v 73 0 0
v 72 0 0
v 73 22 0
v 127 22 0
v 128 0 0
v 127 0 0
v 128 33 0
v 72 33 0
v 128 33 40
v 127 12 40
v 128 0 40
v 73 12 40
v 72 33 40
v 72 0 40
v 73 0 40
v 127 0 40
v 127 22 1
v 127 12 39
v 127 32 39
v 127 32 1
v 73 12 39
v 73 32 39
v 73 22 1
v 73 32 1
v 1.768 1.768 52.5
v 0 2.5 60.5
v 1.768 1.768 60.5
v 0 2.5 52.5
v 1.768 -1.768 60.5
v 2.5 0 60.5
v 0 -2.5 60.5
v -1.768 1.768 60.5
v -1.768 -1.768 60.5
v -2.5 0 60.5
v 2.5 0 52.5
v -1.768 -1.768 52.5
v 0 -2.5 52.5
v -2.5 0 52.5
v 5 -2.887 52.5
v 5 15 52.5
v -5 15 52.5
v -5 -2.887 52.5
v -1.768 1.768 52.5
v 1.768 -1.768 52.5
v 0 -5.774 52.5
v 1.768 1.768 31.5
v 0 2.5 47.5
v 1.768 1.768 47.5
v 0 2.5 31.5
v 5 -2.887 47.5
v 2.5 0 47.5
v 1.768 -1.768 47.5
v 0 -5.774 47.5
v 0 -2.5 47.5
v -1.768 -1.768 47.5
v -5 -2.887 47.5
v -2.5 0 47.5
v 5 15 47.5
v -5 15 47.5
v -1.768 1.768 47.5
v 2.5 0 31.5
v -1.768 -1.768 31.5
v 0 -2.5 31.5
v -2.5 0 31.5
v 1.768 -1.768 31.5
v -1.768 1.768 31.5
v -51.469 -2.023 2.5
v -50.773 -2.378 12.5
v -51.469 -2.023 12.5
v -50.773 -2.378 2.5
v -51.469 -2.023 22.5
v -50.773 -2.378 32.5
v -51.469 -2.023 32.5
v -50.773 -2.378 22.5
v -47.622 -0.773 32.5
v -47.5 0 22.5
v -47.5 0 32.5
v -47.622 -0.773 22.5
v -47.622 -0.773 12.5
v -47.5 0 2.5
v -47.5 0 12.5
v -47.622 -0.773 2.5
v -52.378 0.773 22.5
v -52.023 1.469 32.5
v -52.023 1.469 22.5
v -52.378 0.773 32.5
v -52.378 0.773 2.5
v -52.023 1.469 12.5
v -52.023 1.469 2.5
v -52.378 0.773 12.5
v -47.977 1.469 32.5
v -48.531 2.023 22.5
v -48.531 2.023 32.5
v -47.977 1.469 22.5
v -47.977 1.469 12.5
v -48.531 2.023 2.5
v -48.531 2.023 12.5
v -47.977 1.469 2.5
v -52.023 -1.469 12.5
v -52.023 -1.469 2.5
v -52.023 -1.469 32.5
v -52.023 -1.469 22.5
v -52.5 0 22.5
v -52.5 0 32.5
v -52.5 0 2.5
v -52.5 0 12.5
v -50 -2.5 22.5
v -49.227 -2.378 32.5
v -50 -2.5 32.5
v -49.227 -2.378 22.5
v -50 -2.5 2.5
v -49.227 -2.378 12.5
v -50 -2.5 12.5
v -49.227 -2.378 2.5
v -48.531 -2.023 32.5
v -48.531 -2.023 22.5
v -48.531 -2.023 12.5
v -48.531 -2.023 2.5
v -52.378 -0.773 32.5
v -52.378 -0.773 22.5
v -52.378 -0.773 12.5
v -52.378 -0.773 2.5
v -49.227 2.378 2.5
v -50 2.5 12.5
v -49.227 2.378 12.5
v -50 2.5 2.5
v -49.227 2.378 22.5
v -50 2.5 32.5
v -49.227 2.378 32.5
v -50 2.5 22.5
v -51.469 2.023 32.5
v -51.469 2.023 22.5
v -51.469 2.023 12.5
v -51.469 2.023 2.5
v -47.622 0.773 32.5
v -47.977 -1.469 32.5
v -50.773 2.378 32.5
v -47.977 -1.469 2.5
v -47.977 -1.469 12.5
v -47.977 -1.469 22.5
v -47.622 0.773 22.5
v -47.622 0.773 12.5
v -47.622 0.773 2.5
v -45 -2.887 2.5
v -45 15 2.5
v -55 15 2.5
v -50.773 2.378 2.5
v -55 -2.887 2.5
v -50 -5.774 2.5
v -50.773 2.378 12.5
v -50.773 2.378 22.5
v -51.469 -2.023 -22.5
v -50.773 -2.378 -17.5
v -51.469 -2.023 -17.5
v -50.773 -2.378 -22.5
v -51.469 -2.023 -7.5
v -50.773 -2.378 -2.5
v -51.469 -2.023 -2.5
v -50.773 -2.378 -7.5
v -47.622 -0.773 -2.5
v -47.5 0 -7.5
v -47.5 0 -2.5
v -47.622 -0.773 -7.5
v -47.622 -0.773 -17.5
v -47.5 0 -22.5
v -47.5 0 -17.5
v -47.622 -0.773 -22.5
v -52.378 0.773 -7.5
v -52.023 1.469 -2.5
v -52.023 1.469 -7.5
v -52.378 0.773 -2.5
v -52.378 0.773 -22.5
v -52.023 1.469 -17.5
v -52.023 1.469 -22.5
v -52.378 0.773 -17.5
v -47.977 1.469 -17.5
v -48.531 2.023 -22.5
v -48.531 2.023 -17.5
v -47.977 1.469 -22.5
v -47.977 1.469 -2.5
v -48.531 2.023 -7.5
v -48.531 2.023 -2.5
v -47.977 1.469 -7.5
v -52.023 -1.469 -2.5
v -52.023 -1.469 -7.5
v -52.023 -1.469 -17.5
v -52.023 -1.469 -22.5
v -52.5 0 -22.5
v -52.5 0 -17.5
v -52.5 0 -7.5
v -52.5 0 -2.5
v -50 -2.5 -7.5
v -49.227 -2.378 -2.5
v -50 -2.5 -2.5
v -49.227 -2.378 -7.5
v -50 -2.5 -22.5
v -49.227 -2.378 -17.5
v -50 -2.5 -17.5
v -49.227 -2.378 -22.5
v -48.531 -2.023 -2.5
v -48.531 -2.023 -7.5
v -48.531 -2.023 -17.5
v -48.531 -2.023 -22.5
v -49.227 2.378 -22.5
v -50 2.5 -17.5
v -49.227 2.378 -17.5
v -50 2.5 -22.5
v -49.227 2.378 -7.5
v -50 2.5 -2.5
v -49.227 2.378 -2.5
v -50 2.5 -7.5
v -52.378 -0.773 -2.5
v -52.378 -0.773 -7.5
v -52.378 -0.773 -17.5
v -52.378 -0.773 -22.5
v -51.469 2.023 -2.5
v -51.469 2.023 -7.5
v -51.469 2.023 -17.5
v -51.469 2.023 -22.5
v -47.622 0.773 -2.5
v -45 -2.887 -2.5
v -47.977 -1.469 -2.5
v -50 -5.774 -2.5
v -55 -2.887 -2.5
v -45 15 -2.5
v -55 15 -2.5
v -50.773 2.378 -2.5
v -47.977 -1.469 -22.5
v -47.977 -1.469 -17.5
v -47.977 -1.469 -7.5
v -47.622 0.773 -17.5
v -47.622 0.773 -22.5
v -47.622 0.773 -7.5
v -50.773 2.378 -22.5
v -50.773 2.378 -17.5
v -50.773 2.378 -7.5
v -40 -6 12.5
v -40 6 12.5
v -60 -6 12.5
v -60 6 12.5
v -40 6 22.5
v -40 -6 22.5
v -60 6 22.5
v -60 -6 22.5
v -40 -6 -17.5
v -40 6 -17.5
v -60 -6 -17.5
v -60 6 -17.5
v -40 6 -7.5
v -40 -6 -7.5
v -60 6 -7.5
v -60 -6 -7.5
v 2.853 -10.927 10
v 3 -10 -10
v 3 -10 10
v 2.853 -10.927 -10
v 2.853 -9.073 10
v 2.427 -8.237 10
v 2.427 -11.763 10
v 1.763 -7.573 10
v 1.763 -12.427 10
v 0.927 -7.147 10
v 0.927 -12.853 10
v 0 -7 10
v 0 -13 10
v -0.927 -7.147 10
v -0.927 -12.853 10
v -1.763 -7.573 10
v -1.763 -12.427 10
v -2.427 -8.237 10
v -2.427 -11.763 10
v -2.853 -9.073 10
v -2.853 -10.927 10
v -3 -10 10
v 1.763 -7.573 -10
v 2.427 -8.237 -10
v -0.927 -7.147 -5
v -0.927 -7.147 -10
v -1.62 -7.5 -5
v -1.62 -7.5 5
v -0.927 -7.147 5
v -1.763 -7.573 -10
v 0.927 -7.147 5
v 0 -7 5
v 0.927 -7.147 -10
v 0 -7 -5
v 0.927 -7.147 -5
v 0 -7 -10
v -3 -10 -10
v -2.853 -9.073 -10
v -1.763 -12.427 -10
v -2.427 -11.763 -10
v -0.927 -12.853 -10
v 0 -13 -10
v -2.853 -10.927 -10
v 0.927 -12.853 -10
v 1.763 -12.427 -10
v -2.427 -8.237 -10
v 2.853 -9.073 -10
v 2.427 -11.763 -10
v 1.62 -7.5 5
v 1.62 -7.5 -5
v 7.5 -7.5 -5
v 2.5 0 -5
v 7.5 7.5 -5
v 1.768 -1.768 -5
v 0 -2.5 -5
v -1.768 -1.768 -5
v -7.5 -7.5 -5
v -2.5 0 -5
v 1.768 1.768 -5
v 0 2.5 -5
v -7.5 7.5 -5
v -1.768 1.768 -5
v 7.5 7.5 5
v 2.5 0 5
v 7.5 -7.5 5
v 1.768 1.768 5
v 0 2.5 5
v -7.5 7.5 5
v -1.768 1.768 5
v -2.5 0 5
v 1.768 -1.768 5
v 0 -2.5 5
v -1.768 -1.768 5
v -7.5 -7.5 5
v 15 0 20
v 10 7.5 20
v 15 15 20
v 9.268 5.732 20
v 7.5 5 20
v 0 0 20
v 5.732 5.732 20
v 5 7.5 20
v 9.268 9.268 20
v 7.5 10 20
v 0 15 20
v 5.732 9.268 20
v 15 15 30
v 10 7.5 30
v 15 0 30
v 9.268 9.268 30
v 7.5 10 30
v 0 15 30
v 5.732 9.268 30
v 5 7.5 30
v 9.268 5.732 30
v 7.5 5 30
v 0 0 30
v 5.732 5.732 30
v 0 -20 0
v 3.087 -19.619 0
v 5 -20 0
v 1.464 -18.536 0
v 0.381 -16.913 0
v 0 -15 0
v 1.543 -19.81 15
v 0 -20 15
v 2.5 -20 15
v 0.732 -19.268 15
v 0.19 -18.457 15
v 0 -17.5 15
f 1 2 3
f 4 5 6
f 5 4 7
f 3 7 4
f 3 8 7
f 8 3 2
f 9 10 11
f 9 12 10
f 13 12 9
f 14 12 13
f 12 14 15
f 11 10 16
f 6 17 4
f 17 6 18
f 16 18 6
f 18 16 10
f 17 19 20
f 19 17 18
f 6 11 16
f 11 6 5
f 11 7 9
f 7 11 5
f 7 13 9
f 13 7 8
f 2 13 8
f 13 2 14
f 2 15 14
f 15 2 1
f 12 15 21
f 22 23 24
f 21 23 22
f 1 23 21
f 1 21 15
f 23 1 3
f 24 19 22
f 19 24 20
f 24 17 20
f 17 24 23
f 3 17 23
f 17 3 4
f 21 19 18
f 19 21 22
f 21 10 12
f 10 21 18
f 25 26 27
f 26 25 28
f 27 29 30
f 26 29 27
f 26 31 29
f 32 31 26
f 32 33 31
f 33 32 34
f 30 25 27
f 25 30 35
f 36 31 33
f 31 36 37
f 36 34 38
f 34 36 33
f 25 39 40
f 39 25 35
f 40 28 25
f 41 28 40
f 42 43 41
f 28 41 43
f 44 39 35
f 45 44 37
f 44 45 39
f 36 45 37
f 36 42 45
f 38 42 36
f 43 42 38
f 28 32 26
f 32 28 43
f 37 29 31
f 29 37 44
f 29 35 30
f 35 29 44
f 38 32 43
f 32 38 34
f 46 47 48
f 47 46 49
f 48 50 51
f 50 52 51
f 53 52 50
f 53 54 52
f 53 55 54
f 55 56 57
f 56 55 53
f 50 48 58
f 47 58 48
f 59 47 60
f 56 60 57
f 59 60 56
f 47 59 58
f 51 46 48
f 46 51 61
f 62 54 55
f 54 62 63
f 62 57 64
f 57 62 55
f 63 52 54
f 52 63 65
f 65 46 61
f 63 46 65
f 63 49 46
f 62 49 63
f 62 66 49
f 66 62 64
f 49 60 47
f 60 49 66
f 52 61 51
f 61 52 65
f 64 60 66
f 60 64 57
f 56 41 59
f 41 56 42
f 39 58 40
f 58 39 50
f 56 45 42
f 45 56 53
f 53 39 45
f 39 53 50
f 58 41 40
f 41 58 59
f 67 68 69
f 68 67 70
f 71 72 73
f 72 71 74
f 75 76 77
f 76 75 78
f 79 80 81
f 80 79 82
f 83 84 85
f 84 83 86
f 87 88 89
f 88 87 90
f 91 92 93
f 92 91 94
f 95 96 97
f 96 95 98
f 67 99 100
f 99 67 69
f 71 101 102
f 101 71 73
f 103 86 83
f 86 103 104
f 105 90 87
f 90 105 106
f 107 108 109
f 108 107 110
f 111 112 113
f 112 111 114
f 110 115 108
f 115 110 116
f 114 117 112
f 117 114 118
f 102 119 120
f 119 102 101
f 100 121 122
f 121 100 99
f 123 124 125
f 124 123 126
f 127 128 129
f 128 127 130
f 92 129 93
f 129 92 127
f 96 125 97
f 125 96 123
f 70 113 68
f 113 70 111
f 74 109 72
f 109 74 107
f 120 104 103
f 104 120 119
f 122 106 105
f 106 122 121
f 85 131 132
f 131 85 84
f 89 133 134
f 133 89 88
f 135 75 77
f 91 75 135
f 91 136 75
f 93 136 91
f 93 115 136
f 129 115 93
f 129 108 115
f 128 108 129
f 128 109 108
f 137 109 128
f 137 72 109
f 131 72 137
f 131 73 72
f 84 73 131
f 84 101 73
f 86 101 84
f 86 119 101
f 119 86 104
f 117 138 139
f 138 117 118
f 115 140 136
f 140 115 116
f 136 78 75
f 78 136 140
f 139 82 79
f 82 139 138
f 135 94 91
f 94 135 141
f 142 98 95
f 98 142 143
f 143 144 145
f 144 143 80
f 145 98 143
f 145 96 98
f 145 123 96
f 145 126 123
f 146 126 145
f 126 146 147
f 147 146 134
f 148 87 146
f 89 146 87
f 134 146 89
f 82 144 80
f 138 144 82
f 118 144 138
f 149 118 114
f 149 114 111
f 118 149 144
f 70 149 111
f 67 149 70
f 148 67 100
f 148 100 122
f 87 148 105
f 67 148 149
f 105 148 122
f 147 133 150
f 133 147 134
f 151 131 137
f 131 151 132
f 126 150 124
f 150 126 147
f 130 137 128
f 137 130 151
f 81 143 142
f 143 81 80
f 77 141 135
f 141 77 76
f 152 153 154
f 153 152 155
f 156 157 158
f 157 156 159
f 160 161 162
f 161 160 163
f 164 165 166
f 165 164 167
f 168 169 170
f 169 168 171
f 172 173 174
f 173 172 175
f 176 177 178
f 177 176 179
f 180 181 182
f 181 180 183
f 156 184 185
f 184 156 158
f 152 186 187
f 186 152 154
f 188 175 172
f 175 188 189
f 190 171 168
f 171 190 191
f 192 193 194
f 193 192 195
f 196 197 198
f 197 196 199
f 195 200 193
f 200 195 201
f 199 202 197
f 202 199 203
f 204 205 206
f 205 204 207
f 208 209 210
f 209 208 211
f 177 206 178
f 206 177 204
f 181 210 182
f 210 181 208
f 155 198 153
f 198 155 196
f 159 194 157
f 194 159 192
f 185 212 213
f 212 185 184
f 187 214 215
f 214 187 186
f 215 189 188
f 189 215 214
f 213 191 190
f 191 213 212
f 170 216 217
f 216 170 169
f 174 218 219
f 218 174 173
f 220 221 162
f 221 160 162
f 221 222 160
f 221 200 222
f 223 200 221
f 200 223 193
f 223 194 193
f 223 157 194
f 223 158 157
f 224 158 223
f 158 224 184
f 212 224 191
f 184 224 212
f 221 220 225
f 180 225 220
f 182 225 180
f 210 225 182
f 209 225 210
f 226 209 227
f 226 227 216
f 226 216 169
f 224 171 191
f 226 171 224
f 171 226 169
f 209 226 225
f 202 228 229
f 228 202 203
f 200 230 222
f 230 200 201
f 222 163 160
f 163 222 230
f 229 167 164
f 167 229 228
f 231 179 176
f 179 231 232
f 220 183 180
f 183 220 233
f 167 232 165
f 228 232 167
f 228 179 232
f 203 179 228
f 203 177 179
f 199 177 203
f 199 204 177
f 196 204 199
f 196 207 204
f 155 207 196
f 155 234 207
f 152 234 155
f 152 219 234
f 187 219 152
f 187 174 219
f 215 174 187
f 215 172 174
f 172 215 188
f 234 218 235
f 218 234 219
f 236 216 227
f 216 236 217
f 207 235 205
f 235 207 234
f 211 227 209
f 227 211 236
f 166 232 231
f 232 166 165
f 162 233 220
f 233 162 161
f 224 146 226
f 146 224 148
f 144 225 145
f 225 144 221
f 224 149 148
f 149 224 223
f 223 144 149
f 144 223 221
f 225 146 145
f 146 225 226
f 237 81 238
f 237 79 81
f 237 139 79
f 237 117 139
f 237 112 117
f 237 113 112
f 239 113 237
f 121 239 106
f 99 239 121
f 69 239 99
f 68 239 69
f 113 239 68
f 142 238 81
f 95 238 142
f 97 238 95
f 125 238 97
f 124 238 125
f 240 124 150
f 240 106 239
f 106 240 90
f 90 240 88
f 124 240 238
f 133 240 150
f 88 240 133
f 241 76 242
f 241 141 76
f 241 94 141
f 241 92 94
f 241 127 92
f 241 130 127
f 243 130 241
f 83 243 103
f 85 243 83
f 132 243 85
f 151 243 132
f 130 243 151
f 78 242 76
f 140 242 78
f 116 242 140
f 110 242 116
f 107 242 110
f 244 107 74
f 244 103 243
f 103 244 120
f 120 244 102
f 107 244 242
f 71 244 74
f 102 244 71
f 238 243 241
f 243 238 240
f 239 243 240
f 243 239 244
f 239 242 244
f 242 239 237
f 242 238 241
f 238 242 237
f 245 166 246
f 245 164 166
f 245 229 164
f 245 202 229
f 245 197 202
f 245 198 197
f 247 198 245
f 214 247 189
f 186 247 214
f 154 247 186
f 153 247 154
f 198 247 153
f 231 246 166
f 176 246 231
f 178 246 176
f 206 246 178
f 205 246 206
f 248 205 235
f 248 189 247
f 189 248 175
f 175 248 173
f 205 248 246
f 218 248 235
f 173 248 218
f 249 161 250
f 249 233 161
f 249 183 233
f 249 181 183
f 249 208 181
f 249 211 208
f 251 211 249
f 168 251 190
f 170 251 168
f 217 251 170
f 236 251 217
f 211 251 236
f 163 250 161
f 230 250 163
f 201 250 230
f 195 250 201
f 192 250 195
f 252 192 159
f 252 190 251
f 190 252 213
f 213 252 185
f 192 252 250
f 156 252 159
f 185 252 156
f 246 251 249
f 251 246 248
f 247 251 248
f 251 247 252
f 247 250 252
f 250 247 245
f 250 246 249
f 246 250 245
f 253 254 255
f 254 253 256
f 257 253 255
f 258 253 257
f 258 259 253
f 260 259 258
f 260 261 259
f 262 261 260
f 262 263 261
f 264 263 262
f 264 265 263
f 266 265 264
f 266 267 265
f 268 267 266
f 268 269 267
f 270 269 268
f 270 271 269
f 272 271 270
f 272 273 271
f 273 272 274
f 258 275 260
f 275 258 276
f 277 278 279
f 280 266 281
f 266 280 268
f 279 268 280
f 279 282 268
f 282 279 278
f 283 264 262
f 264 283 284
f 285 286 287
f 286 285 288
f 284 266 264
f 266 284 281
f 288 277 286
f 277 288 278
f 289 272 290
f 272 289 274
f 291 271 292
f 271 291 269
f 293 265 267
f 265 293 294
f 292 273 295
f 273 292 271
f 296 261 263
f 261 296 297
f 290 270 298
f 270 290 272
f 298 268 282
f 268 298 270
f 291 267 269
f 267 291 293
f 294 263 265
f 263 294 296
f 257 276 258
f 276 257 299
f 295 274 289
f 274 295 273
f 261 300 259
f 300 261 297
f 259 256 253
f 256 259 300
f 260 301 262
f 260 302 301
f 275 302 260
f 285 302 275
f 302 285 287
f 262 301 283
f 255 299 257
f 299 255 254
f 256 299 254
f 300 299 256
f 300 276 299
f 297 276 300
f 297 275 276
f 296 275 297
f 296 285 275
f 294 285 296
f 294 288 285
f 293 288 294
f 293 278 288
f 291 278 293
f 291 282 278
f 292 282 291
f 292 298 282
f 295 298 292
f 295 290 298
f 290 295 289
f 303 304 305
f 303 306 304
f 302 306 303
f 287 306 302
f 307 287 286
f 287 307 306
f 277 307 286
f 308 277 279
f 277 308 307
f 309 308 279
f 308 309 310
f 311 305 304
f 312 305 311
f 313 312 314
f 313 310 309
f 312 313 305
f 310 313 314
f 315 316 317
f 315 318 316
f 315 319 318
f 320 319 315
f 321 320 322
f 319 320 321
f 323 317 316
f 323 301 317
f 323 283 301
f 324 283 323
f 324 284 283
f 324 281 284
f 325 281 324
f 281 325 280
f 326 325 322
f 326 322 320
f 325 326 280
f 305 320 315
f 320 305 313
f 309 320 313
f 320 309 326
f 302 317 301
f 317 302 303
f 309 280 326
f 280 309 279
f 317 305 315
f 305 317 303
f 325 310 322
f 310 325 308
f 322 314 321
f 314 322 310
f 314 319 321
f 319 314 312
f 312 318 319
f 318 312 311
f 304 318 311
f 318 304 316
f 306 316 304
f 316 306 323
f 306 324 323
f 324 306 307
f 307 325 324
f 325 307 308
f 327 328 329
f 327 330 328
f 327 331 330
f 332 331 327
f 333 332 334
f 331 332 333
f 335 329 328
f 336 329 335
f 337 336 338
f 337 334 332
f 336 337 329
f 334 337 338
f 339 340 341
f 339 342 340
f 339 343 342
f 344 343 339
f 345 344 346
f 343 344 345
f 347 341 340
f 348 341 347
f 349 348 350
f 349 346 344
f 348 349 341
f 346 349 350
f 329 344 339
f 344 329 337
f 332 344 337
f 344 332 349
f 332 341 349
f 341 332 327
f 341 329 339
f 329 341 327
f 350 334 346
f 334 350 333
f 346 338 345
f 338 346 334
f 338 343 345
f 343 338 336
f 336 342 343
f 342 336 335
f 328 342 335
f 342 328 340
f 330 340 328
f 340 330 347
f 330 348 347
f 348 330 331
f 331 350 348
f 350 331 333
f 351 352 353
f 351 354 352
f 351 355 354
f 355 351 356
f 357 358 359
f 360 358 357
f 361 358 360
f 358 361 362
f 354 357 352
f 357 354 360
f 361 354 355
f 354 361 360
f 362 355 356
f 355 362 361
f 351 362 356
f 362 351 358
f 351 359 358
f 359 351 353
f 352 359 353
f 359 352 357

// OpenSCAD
// file: metric_dimensions.scad
// Dimensions a few metric fasteners.
// Author: James Synge
// Units: mm

////////////////////////////////////////////////////////////////////////////////
// Selected metric screw and nut size info (maximum dimensions), ISO 4032.
// For the washers, using standard DIN 125 / ISO 7089:
//    https://www.engineersedge.com/iso_flat_washer.htm

m4_screw_diam = 4;
m4_hole_diam = 4.5;
m4_nut_diam1 = 7;  // Width across the flats
m4_nut_diam2 = 7.66;  // Width across the corners
m4_nut_height = 3.2;
m4_washer_hole_diam = 4.3;
m4_washer_diam = 9;
m4_washer_thickness = 0.8;

m5_screw_diam = 5;
m5_hole_diam = 5.5;
m5_nut_diam1 = 8;  // Width across the flats
m5_nut_diam2 = 8.79;  // Width across the corners
m5_nut_height = 4.7;


// Given the width across a six sided nut (flat side to flat side),
// how wide is the nut from point to farthest point (i.e. what is the
// diameter of the smallest circle that will enclose the nut).
function hex_short_to_long_diag(d) = d * 2.0 / sqrt(3.0);
// main file
include <metric_dimensions.scad>


translate([100,0,0]) motor_cover_shell(50, 40, 30, shell_wall=1,
bracing0=10, bracing1=20
);


color("blue")
translate([0,-10,0]) {
  $fn=20;
  symmetric_z_cylinder(6,20);
}

module symmetric_z_cylinder(d=undef, l=undef, r=undef, convexity=3) {
  assert((d>0 && r==undef) || (d==undef && r>0));
  assert(l!=undef && l>0);
  translate([0,0,-l/2])
    linear_extrude(height=l, convexity=convexity)
      circle(d=d, r=r);
}



// Helper for creating the hollow box
// around a motor cover. Has 3 sides,
// not counting those due to the non-zero
// thickness of the shell.
// extra_z is below the z=0 plane.
module motor_cover_shell(motor_w, motor_h, motor_z, motor_gap=2, shell_wall=0, shellw=0, shellh=0, shellz=0, extra_z=0, bracing0=0, bracing1=0) {

  shell_w = max(shell_wall, shellw);
  shell_h = max(shell_wall, shellh);
  shell_z = max(shell_wall, shellz);

  assert(shell_w>0);
  assert(shell_z>0);

  inner_w=motor_w + motor_gap*2;
  inner_z=motor_z + motor_gap + extra_z;
  
  outer_w = inner_w + shell_w * 2;
  outer_z = inner_z + shell_z;

  linear_extrude(height=motor_h, convexity=10) {
    translate([-outer_w/2, -extra_z, 0]) {
      difference() {
        square([outer_w, outer_z], center=false);
        translate([shell_w,0,0])
          square([inner_w, inner_z], center=false);
      }
    }
  }
  
  if (bracing0 > 0) {
    // Add some strength at the z=0 plane.
    assert(shell_h>0);
    linear_extrude(height=shell_wall, convexity=10)
      translate([-outer_w/2, motor_z + motor_gap - bracing0, 0]) 
        square([outer_w, bracing0+shell_wall]);
  }

  if (bracing1 > 0) {
    // Add some strength at the z=motor_h plane.
    assert(shell_h>0);
    translate([0,0, motor_h-shell_wall])
      linear_extrude(height=shell_wall, convexity=10)
        translate([-outer_w/2, motor_z + motor_gap - bracing1, 0]) 
          square([outer_w, bracing1+shell_wall]);
  }
}



translate([0, 0, 50]) nut_slot(nut_diam=10, nut_height=5, depth=15, bolt_diam=5, bolt_up=8, bolt_down=16);

module nut_slot(nut_diam=0, nut_height=0, depth=0, bolt_diam=0, bolt_up=0, bolt_down=0, fn=undef) {
  translate([0, 0, -nut_height/2]) {
    rotate([0,0,360/12])
      linear_extrude(height=nut_height)
        circle(d=hex_short_to_long_diag(nut_diam), $fn=6);
    linear_extrude(height=nut_height)
      translate([-nut_diam/2, 0, 0])
        square([nut_diam, depth], center=false);
  
    assert(bolt_diam >= 0);
    assert(bolt_up >= 0);
    assert(bolt_down >= 0);
  
    if (bolt_diam > 0) {
      if (bolt_up > 0) {
        translate([0,0,nut_height])
          linear_extrude(height=bolt_up)
            circle(d=bolt_diam, $fn=fn);
      }
      if (bolt_down > 0) {
        translate([0,0,-bolt_down])
          linear_extrude(height=bolt_down)
            circle(d=bolt_diam, $fn=fn);
      }
    }
  }
}

module nut(nut_hex_diam=undef, screw_diam=undef, nut_height=undef) {
  linear_extrude(height=nut_height) {
    difference() {
      circle(d=hex_short_to_long_diag(nut_hex_diam), $fn=6);
      circle(d=screw_diam, $fn=30);
    }
  }
}

module screw_gusset(x, y, z, d, center=false, fn=undef) {
  xlate = center ? [0, 0, -z/2] : [x/2, y/2, 0];
  translate(xlate) {
    linear_extrude(height=z, convexity=10) {
      difference() {
        square([x, y], center=true);
        circle(d=d, $fn=fn);
      }
    }
  }
}
translate([0,0,0]) screw_gusset(15,15,10,5, center=true);
translate([0,0,20]) screw_gusset(15,15,10,5);

module demo_screw(shaft_diam, shaft_length, head_diam, head_height) {
  color("silver") {
    cylinder(d=head_diam, h=head_height);
    translate([0, 0, head_height])
      cylinder(d=shaft_diam, h=shaft_length);
  }
}

// Space to be occupied by a nut (show_gusset=false) or a screw gusset (show_gusset=true)
// for the corresponding bolt.
module nut_slot_and_screw_gusset(show_gusset=true, nut_diam=0, nut_height=0, depth=0, bolt_diam=0, bolt_up=0, bolt_down=0, gusset_w=0, gusset_h=0, gusset_z=0, gusset_dist=0, fn=undef) {
  // x_offset = (shell2_outside_x + dec2_radius) / 2;
  // y_offset = nut_height+nut_slot_margin;

  if (show_gusset) {
    z_dist = gusset_dist == 0 ? 0 : (nut_height + gusset_z) / 2 + abs(gusset_dist);
    z_offset = gusset_dist > 0 ? z_dist : -z_dist;
    translate([0, 0, z_offset])
      screw_gusset(gusset_w, gusset_h, gusset_z, bolt_diam, center=true, fn=fn);
  } else {
    nut_slot(nut_diam=nut_diam, nut_height=nut_height,
                   depth=depth,
                   bolt_diam=bolt_diam,
                   bolt_up=bolt_up,
                   bolt_down=bolt_down, fn=fn);
  }
}

module test_nut_slot_and_screw_gusset(show_gusset=true, below=false) {
  gusset_dist = below ? -5 : 10;
  nut_slot_and_screw_gusset(show_gusset=show_gusset, nut_diam=10, nut_height=5, depth=15, bolt_diam=5, bolt_up=30, bolt_down=20, gusset_w=20, gusset_h=12, gusset_z=10, gusset_dist=gusset_dist, fn=20);
}

translate([-50, 0, 0]) {
  test_nut_slot_and_screw_gusset(show_gusset=true, below=false);
  test_nut_slot_and_screw_gusset(show_gusset=false, below=false);
  test_nut_slot_and_screw_gusset(show_gusset=true, below=true);
}









module fillet_outline(radius) {
  intersection() {
    square([radius, radius], center=false);
    translate([radius, radius])
      difference() {
        circle(r=radius*2);
        circle(r=radius);
      };
  }
}

module fillet_extrusion(radius, length, scale=1.0) {
  linear_extrude(height=length, scale=scale)
    fillet_outline(radius);
}
translate([0,-20,0])
fillet_extrusion(5,15,scale=0.5);


module annulus(d1=undef, r1=undef, d2=undef, r2=undef, solid=false) {
  difference() {
    circle(r=r2, d=d2);
    // solid is support for creating solids for CSG operations.
    if (!solid) circle(r=r1, d=d1);
  };
}
